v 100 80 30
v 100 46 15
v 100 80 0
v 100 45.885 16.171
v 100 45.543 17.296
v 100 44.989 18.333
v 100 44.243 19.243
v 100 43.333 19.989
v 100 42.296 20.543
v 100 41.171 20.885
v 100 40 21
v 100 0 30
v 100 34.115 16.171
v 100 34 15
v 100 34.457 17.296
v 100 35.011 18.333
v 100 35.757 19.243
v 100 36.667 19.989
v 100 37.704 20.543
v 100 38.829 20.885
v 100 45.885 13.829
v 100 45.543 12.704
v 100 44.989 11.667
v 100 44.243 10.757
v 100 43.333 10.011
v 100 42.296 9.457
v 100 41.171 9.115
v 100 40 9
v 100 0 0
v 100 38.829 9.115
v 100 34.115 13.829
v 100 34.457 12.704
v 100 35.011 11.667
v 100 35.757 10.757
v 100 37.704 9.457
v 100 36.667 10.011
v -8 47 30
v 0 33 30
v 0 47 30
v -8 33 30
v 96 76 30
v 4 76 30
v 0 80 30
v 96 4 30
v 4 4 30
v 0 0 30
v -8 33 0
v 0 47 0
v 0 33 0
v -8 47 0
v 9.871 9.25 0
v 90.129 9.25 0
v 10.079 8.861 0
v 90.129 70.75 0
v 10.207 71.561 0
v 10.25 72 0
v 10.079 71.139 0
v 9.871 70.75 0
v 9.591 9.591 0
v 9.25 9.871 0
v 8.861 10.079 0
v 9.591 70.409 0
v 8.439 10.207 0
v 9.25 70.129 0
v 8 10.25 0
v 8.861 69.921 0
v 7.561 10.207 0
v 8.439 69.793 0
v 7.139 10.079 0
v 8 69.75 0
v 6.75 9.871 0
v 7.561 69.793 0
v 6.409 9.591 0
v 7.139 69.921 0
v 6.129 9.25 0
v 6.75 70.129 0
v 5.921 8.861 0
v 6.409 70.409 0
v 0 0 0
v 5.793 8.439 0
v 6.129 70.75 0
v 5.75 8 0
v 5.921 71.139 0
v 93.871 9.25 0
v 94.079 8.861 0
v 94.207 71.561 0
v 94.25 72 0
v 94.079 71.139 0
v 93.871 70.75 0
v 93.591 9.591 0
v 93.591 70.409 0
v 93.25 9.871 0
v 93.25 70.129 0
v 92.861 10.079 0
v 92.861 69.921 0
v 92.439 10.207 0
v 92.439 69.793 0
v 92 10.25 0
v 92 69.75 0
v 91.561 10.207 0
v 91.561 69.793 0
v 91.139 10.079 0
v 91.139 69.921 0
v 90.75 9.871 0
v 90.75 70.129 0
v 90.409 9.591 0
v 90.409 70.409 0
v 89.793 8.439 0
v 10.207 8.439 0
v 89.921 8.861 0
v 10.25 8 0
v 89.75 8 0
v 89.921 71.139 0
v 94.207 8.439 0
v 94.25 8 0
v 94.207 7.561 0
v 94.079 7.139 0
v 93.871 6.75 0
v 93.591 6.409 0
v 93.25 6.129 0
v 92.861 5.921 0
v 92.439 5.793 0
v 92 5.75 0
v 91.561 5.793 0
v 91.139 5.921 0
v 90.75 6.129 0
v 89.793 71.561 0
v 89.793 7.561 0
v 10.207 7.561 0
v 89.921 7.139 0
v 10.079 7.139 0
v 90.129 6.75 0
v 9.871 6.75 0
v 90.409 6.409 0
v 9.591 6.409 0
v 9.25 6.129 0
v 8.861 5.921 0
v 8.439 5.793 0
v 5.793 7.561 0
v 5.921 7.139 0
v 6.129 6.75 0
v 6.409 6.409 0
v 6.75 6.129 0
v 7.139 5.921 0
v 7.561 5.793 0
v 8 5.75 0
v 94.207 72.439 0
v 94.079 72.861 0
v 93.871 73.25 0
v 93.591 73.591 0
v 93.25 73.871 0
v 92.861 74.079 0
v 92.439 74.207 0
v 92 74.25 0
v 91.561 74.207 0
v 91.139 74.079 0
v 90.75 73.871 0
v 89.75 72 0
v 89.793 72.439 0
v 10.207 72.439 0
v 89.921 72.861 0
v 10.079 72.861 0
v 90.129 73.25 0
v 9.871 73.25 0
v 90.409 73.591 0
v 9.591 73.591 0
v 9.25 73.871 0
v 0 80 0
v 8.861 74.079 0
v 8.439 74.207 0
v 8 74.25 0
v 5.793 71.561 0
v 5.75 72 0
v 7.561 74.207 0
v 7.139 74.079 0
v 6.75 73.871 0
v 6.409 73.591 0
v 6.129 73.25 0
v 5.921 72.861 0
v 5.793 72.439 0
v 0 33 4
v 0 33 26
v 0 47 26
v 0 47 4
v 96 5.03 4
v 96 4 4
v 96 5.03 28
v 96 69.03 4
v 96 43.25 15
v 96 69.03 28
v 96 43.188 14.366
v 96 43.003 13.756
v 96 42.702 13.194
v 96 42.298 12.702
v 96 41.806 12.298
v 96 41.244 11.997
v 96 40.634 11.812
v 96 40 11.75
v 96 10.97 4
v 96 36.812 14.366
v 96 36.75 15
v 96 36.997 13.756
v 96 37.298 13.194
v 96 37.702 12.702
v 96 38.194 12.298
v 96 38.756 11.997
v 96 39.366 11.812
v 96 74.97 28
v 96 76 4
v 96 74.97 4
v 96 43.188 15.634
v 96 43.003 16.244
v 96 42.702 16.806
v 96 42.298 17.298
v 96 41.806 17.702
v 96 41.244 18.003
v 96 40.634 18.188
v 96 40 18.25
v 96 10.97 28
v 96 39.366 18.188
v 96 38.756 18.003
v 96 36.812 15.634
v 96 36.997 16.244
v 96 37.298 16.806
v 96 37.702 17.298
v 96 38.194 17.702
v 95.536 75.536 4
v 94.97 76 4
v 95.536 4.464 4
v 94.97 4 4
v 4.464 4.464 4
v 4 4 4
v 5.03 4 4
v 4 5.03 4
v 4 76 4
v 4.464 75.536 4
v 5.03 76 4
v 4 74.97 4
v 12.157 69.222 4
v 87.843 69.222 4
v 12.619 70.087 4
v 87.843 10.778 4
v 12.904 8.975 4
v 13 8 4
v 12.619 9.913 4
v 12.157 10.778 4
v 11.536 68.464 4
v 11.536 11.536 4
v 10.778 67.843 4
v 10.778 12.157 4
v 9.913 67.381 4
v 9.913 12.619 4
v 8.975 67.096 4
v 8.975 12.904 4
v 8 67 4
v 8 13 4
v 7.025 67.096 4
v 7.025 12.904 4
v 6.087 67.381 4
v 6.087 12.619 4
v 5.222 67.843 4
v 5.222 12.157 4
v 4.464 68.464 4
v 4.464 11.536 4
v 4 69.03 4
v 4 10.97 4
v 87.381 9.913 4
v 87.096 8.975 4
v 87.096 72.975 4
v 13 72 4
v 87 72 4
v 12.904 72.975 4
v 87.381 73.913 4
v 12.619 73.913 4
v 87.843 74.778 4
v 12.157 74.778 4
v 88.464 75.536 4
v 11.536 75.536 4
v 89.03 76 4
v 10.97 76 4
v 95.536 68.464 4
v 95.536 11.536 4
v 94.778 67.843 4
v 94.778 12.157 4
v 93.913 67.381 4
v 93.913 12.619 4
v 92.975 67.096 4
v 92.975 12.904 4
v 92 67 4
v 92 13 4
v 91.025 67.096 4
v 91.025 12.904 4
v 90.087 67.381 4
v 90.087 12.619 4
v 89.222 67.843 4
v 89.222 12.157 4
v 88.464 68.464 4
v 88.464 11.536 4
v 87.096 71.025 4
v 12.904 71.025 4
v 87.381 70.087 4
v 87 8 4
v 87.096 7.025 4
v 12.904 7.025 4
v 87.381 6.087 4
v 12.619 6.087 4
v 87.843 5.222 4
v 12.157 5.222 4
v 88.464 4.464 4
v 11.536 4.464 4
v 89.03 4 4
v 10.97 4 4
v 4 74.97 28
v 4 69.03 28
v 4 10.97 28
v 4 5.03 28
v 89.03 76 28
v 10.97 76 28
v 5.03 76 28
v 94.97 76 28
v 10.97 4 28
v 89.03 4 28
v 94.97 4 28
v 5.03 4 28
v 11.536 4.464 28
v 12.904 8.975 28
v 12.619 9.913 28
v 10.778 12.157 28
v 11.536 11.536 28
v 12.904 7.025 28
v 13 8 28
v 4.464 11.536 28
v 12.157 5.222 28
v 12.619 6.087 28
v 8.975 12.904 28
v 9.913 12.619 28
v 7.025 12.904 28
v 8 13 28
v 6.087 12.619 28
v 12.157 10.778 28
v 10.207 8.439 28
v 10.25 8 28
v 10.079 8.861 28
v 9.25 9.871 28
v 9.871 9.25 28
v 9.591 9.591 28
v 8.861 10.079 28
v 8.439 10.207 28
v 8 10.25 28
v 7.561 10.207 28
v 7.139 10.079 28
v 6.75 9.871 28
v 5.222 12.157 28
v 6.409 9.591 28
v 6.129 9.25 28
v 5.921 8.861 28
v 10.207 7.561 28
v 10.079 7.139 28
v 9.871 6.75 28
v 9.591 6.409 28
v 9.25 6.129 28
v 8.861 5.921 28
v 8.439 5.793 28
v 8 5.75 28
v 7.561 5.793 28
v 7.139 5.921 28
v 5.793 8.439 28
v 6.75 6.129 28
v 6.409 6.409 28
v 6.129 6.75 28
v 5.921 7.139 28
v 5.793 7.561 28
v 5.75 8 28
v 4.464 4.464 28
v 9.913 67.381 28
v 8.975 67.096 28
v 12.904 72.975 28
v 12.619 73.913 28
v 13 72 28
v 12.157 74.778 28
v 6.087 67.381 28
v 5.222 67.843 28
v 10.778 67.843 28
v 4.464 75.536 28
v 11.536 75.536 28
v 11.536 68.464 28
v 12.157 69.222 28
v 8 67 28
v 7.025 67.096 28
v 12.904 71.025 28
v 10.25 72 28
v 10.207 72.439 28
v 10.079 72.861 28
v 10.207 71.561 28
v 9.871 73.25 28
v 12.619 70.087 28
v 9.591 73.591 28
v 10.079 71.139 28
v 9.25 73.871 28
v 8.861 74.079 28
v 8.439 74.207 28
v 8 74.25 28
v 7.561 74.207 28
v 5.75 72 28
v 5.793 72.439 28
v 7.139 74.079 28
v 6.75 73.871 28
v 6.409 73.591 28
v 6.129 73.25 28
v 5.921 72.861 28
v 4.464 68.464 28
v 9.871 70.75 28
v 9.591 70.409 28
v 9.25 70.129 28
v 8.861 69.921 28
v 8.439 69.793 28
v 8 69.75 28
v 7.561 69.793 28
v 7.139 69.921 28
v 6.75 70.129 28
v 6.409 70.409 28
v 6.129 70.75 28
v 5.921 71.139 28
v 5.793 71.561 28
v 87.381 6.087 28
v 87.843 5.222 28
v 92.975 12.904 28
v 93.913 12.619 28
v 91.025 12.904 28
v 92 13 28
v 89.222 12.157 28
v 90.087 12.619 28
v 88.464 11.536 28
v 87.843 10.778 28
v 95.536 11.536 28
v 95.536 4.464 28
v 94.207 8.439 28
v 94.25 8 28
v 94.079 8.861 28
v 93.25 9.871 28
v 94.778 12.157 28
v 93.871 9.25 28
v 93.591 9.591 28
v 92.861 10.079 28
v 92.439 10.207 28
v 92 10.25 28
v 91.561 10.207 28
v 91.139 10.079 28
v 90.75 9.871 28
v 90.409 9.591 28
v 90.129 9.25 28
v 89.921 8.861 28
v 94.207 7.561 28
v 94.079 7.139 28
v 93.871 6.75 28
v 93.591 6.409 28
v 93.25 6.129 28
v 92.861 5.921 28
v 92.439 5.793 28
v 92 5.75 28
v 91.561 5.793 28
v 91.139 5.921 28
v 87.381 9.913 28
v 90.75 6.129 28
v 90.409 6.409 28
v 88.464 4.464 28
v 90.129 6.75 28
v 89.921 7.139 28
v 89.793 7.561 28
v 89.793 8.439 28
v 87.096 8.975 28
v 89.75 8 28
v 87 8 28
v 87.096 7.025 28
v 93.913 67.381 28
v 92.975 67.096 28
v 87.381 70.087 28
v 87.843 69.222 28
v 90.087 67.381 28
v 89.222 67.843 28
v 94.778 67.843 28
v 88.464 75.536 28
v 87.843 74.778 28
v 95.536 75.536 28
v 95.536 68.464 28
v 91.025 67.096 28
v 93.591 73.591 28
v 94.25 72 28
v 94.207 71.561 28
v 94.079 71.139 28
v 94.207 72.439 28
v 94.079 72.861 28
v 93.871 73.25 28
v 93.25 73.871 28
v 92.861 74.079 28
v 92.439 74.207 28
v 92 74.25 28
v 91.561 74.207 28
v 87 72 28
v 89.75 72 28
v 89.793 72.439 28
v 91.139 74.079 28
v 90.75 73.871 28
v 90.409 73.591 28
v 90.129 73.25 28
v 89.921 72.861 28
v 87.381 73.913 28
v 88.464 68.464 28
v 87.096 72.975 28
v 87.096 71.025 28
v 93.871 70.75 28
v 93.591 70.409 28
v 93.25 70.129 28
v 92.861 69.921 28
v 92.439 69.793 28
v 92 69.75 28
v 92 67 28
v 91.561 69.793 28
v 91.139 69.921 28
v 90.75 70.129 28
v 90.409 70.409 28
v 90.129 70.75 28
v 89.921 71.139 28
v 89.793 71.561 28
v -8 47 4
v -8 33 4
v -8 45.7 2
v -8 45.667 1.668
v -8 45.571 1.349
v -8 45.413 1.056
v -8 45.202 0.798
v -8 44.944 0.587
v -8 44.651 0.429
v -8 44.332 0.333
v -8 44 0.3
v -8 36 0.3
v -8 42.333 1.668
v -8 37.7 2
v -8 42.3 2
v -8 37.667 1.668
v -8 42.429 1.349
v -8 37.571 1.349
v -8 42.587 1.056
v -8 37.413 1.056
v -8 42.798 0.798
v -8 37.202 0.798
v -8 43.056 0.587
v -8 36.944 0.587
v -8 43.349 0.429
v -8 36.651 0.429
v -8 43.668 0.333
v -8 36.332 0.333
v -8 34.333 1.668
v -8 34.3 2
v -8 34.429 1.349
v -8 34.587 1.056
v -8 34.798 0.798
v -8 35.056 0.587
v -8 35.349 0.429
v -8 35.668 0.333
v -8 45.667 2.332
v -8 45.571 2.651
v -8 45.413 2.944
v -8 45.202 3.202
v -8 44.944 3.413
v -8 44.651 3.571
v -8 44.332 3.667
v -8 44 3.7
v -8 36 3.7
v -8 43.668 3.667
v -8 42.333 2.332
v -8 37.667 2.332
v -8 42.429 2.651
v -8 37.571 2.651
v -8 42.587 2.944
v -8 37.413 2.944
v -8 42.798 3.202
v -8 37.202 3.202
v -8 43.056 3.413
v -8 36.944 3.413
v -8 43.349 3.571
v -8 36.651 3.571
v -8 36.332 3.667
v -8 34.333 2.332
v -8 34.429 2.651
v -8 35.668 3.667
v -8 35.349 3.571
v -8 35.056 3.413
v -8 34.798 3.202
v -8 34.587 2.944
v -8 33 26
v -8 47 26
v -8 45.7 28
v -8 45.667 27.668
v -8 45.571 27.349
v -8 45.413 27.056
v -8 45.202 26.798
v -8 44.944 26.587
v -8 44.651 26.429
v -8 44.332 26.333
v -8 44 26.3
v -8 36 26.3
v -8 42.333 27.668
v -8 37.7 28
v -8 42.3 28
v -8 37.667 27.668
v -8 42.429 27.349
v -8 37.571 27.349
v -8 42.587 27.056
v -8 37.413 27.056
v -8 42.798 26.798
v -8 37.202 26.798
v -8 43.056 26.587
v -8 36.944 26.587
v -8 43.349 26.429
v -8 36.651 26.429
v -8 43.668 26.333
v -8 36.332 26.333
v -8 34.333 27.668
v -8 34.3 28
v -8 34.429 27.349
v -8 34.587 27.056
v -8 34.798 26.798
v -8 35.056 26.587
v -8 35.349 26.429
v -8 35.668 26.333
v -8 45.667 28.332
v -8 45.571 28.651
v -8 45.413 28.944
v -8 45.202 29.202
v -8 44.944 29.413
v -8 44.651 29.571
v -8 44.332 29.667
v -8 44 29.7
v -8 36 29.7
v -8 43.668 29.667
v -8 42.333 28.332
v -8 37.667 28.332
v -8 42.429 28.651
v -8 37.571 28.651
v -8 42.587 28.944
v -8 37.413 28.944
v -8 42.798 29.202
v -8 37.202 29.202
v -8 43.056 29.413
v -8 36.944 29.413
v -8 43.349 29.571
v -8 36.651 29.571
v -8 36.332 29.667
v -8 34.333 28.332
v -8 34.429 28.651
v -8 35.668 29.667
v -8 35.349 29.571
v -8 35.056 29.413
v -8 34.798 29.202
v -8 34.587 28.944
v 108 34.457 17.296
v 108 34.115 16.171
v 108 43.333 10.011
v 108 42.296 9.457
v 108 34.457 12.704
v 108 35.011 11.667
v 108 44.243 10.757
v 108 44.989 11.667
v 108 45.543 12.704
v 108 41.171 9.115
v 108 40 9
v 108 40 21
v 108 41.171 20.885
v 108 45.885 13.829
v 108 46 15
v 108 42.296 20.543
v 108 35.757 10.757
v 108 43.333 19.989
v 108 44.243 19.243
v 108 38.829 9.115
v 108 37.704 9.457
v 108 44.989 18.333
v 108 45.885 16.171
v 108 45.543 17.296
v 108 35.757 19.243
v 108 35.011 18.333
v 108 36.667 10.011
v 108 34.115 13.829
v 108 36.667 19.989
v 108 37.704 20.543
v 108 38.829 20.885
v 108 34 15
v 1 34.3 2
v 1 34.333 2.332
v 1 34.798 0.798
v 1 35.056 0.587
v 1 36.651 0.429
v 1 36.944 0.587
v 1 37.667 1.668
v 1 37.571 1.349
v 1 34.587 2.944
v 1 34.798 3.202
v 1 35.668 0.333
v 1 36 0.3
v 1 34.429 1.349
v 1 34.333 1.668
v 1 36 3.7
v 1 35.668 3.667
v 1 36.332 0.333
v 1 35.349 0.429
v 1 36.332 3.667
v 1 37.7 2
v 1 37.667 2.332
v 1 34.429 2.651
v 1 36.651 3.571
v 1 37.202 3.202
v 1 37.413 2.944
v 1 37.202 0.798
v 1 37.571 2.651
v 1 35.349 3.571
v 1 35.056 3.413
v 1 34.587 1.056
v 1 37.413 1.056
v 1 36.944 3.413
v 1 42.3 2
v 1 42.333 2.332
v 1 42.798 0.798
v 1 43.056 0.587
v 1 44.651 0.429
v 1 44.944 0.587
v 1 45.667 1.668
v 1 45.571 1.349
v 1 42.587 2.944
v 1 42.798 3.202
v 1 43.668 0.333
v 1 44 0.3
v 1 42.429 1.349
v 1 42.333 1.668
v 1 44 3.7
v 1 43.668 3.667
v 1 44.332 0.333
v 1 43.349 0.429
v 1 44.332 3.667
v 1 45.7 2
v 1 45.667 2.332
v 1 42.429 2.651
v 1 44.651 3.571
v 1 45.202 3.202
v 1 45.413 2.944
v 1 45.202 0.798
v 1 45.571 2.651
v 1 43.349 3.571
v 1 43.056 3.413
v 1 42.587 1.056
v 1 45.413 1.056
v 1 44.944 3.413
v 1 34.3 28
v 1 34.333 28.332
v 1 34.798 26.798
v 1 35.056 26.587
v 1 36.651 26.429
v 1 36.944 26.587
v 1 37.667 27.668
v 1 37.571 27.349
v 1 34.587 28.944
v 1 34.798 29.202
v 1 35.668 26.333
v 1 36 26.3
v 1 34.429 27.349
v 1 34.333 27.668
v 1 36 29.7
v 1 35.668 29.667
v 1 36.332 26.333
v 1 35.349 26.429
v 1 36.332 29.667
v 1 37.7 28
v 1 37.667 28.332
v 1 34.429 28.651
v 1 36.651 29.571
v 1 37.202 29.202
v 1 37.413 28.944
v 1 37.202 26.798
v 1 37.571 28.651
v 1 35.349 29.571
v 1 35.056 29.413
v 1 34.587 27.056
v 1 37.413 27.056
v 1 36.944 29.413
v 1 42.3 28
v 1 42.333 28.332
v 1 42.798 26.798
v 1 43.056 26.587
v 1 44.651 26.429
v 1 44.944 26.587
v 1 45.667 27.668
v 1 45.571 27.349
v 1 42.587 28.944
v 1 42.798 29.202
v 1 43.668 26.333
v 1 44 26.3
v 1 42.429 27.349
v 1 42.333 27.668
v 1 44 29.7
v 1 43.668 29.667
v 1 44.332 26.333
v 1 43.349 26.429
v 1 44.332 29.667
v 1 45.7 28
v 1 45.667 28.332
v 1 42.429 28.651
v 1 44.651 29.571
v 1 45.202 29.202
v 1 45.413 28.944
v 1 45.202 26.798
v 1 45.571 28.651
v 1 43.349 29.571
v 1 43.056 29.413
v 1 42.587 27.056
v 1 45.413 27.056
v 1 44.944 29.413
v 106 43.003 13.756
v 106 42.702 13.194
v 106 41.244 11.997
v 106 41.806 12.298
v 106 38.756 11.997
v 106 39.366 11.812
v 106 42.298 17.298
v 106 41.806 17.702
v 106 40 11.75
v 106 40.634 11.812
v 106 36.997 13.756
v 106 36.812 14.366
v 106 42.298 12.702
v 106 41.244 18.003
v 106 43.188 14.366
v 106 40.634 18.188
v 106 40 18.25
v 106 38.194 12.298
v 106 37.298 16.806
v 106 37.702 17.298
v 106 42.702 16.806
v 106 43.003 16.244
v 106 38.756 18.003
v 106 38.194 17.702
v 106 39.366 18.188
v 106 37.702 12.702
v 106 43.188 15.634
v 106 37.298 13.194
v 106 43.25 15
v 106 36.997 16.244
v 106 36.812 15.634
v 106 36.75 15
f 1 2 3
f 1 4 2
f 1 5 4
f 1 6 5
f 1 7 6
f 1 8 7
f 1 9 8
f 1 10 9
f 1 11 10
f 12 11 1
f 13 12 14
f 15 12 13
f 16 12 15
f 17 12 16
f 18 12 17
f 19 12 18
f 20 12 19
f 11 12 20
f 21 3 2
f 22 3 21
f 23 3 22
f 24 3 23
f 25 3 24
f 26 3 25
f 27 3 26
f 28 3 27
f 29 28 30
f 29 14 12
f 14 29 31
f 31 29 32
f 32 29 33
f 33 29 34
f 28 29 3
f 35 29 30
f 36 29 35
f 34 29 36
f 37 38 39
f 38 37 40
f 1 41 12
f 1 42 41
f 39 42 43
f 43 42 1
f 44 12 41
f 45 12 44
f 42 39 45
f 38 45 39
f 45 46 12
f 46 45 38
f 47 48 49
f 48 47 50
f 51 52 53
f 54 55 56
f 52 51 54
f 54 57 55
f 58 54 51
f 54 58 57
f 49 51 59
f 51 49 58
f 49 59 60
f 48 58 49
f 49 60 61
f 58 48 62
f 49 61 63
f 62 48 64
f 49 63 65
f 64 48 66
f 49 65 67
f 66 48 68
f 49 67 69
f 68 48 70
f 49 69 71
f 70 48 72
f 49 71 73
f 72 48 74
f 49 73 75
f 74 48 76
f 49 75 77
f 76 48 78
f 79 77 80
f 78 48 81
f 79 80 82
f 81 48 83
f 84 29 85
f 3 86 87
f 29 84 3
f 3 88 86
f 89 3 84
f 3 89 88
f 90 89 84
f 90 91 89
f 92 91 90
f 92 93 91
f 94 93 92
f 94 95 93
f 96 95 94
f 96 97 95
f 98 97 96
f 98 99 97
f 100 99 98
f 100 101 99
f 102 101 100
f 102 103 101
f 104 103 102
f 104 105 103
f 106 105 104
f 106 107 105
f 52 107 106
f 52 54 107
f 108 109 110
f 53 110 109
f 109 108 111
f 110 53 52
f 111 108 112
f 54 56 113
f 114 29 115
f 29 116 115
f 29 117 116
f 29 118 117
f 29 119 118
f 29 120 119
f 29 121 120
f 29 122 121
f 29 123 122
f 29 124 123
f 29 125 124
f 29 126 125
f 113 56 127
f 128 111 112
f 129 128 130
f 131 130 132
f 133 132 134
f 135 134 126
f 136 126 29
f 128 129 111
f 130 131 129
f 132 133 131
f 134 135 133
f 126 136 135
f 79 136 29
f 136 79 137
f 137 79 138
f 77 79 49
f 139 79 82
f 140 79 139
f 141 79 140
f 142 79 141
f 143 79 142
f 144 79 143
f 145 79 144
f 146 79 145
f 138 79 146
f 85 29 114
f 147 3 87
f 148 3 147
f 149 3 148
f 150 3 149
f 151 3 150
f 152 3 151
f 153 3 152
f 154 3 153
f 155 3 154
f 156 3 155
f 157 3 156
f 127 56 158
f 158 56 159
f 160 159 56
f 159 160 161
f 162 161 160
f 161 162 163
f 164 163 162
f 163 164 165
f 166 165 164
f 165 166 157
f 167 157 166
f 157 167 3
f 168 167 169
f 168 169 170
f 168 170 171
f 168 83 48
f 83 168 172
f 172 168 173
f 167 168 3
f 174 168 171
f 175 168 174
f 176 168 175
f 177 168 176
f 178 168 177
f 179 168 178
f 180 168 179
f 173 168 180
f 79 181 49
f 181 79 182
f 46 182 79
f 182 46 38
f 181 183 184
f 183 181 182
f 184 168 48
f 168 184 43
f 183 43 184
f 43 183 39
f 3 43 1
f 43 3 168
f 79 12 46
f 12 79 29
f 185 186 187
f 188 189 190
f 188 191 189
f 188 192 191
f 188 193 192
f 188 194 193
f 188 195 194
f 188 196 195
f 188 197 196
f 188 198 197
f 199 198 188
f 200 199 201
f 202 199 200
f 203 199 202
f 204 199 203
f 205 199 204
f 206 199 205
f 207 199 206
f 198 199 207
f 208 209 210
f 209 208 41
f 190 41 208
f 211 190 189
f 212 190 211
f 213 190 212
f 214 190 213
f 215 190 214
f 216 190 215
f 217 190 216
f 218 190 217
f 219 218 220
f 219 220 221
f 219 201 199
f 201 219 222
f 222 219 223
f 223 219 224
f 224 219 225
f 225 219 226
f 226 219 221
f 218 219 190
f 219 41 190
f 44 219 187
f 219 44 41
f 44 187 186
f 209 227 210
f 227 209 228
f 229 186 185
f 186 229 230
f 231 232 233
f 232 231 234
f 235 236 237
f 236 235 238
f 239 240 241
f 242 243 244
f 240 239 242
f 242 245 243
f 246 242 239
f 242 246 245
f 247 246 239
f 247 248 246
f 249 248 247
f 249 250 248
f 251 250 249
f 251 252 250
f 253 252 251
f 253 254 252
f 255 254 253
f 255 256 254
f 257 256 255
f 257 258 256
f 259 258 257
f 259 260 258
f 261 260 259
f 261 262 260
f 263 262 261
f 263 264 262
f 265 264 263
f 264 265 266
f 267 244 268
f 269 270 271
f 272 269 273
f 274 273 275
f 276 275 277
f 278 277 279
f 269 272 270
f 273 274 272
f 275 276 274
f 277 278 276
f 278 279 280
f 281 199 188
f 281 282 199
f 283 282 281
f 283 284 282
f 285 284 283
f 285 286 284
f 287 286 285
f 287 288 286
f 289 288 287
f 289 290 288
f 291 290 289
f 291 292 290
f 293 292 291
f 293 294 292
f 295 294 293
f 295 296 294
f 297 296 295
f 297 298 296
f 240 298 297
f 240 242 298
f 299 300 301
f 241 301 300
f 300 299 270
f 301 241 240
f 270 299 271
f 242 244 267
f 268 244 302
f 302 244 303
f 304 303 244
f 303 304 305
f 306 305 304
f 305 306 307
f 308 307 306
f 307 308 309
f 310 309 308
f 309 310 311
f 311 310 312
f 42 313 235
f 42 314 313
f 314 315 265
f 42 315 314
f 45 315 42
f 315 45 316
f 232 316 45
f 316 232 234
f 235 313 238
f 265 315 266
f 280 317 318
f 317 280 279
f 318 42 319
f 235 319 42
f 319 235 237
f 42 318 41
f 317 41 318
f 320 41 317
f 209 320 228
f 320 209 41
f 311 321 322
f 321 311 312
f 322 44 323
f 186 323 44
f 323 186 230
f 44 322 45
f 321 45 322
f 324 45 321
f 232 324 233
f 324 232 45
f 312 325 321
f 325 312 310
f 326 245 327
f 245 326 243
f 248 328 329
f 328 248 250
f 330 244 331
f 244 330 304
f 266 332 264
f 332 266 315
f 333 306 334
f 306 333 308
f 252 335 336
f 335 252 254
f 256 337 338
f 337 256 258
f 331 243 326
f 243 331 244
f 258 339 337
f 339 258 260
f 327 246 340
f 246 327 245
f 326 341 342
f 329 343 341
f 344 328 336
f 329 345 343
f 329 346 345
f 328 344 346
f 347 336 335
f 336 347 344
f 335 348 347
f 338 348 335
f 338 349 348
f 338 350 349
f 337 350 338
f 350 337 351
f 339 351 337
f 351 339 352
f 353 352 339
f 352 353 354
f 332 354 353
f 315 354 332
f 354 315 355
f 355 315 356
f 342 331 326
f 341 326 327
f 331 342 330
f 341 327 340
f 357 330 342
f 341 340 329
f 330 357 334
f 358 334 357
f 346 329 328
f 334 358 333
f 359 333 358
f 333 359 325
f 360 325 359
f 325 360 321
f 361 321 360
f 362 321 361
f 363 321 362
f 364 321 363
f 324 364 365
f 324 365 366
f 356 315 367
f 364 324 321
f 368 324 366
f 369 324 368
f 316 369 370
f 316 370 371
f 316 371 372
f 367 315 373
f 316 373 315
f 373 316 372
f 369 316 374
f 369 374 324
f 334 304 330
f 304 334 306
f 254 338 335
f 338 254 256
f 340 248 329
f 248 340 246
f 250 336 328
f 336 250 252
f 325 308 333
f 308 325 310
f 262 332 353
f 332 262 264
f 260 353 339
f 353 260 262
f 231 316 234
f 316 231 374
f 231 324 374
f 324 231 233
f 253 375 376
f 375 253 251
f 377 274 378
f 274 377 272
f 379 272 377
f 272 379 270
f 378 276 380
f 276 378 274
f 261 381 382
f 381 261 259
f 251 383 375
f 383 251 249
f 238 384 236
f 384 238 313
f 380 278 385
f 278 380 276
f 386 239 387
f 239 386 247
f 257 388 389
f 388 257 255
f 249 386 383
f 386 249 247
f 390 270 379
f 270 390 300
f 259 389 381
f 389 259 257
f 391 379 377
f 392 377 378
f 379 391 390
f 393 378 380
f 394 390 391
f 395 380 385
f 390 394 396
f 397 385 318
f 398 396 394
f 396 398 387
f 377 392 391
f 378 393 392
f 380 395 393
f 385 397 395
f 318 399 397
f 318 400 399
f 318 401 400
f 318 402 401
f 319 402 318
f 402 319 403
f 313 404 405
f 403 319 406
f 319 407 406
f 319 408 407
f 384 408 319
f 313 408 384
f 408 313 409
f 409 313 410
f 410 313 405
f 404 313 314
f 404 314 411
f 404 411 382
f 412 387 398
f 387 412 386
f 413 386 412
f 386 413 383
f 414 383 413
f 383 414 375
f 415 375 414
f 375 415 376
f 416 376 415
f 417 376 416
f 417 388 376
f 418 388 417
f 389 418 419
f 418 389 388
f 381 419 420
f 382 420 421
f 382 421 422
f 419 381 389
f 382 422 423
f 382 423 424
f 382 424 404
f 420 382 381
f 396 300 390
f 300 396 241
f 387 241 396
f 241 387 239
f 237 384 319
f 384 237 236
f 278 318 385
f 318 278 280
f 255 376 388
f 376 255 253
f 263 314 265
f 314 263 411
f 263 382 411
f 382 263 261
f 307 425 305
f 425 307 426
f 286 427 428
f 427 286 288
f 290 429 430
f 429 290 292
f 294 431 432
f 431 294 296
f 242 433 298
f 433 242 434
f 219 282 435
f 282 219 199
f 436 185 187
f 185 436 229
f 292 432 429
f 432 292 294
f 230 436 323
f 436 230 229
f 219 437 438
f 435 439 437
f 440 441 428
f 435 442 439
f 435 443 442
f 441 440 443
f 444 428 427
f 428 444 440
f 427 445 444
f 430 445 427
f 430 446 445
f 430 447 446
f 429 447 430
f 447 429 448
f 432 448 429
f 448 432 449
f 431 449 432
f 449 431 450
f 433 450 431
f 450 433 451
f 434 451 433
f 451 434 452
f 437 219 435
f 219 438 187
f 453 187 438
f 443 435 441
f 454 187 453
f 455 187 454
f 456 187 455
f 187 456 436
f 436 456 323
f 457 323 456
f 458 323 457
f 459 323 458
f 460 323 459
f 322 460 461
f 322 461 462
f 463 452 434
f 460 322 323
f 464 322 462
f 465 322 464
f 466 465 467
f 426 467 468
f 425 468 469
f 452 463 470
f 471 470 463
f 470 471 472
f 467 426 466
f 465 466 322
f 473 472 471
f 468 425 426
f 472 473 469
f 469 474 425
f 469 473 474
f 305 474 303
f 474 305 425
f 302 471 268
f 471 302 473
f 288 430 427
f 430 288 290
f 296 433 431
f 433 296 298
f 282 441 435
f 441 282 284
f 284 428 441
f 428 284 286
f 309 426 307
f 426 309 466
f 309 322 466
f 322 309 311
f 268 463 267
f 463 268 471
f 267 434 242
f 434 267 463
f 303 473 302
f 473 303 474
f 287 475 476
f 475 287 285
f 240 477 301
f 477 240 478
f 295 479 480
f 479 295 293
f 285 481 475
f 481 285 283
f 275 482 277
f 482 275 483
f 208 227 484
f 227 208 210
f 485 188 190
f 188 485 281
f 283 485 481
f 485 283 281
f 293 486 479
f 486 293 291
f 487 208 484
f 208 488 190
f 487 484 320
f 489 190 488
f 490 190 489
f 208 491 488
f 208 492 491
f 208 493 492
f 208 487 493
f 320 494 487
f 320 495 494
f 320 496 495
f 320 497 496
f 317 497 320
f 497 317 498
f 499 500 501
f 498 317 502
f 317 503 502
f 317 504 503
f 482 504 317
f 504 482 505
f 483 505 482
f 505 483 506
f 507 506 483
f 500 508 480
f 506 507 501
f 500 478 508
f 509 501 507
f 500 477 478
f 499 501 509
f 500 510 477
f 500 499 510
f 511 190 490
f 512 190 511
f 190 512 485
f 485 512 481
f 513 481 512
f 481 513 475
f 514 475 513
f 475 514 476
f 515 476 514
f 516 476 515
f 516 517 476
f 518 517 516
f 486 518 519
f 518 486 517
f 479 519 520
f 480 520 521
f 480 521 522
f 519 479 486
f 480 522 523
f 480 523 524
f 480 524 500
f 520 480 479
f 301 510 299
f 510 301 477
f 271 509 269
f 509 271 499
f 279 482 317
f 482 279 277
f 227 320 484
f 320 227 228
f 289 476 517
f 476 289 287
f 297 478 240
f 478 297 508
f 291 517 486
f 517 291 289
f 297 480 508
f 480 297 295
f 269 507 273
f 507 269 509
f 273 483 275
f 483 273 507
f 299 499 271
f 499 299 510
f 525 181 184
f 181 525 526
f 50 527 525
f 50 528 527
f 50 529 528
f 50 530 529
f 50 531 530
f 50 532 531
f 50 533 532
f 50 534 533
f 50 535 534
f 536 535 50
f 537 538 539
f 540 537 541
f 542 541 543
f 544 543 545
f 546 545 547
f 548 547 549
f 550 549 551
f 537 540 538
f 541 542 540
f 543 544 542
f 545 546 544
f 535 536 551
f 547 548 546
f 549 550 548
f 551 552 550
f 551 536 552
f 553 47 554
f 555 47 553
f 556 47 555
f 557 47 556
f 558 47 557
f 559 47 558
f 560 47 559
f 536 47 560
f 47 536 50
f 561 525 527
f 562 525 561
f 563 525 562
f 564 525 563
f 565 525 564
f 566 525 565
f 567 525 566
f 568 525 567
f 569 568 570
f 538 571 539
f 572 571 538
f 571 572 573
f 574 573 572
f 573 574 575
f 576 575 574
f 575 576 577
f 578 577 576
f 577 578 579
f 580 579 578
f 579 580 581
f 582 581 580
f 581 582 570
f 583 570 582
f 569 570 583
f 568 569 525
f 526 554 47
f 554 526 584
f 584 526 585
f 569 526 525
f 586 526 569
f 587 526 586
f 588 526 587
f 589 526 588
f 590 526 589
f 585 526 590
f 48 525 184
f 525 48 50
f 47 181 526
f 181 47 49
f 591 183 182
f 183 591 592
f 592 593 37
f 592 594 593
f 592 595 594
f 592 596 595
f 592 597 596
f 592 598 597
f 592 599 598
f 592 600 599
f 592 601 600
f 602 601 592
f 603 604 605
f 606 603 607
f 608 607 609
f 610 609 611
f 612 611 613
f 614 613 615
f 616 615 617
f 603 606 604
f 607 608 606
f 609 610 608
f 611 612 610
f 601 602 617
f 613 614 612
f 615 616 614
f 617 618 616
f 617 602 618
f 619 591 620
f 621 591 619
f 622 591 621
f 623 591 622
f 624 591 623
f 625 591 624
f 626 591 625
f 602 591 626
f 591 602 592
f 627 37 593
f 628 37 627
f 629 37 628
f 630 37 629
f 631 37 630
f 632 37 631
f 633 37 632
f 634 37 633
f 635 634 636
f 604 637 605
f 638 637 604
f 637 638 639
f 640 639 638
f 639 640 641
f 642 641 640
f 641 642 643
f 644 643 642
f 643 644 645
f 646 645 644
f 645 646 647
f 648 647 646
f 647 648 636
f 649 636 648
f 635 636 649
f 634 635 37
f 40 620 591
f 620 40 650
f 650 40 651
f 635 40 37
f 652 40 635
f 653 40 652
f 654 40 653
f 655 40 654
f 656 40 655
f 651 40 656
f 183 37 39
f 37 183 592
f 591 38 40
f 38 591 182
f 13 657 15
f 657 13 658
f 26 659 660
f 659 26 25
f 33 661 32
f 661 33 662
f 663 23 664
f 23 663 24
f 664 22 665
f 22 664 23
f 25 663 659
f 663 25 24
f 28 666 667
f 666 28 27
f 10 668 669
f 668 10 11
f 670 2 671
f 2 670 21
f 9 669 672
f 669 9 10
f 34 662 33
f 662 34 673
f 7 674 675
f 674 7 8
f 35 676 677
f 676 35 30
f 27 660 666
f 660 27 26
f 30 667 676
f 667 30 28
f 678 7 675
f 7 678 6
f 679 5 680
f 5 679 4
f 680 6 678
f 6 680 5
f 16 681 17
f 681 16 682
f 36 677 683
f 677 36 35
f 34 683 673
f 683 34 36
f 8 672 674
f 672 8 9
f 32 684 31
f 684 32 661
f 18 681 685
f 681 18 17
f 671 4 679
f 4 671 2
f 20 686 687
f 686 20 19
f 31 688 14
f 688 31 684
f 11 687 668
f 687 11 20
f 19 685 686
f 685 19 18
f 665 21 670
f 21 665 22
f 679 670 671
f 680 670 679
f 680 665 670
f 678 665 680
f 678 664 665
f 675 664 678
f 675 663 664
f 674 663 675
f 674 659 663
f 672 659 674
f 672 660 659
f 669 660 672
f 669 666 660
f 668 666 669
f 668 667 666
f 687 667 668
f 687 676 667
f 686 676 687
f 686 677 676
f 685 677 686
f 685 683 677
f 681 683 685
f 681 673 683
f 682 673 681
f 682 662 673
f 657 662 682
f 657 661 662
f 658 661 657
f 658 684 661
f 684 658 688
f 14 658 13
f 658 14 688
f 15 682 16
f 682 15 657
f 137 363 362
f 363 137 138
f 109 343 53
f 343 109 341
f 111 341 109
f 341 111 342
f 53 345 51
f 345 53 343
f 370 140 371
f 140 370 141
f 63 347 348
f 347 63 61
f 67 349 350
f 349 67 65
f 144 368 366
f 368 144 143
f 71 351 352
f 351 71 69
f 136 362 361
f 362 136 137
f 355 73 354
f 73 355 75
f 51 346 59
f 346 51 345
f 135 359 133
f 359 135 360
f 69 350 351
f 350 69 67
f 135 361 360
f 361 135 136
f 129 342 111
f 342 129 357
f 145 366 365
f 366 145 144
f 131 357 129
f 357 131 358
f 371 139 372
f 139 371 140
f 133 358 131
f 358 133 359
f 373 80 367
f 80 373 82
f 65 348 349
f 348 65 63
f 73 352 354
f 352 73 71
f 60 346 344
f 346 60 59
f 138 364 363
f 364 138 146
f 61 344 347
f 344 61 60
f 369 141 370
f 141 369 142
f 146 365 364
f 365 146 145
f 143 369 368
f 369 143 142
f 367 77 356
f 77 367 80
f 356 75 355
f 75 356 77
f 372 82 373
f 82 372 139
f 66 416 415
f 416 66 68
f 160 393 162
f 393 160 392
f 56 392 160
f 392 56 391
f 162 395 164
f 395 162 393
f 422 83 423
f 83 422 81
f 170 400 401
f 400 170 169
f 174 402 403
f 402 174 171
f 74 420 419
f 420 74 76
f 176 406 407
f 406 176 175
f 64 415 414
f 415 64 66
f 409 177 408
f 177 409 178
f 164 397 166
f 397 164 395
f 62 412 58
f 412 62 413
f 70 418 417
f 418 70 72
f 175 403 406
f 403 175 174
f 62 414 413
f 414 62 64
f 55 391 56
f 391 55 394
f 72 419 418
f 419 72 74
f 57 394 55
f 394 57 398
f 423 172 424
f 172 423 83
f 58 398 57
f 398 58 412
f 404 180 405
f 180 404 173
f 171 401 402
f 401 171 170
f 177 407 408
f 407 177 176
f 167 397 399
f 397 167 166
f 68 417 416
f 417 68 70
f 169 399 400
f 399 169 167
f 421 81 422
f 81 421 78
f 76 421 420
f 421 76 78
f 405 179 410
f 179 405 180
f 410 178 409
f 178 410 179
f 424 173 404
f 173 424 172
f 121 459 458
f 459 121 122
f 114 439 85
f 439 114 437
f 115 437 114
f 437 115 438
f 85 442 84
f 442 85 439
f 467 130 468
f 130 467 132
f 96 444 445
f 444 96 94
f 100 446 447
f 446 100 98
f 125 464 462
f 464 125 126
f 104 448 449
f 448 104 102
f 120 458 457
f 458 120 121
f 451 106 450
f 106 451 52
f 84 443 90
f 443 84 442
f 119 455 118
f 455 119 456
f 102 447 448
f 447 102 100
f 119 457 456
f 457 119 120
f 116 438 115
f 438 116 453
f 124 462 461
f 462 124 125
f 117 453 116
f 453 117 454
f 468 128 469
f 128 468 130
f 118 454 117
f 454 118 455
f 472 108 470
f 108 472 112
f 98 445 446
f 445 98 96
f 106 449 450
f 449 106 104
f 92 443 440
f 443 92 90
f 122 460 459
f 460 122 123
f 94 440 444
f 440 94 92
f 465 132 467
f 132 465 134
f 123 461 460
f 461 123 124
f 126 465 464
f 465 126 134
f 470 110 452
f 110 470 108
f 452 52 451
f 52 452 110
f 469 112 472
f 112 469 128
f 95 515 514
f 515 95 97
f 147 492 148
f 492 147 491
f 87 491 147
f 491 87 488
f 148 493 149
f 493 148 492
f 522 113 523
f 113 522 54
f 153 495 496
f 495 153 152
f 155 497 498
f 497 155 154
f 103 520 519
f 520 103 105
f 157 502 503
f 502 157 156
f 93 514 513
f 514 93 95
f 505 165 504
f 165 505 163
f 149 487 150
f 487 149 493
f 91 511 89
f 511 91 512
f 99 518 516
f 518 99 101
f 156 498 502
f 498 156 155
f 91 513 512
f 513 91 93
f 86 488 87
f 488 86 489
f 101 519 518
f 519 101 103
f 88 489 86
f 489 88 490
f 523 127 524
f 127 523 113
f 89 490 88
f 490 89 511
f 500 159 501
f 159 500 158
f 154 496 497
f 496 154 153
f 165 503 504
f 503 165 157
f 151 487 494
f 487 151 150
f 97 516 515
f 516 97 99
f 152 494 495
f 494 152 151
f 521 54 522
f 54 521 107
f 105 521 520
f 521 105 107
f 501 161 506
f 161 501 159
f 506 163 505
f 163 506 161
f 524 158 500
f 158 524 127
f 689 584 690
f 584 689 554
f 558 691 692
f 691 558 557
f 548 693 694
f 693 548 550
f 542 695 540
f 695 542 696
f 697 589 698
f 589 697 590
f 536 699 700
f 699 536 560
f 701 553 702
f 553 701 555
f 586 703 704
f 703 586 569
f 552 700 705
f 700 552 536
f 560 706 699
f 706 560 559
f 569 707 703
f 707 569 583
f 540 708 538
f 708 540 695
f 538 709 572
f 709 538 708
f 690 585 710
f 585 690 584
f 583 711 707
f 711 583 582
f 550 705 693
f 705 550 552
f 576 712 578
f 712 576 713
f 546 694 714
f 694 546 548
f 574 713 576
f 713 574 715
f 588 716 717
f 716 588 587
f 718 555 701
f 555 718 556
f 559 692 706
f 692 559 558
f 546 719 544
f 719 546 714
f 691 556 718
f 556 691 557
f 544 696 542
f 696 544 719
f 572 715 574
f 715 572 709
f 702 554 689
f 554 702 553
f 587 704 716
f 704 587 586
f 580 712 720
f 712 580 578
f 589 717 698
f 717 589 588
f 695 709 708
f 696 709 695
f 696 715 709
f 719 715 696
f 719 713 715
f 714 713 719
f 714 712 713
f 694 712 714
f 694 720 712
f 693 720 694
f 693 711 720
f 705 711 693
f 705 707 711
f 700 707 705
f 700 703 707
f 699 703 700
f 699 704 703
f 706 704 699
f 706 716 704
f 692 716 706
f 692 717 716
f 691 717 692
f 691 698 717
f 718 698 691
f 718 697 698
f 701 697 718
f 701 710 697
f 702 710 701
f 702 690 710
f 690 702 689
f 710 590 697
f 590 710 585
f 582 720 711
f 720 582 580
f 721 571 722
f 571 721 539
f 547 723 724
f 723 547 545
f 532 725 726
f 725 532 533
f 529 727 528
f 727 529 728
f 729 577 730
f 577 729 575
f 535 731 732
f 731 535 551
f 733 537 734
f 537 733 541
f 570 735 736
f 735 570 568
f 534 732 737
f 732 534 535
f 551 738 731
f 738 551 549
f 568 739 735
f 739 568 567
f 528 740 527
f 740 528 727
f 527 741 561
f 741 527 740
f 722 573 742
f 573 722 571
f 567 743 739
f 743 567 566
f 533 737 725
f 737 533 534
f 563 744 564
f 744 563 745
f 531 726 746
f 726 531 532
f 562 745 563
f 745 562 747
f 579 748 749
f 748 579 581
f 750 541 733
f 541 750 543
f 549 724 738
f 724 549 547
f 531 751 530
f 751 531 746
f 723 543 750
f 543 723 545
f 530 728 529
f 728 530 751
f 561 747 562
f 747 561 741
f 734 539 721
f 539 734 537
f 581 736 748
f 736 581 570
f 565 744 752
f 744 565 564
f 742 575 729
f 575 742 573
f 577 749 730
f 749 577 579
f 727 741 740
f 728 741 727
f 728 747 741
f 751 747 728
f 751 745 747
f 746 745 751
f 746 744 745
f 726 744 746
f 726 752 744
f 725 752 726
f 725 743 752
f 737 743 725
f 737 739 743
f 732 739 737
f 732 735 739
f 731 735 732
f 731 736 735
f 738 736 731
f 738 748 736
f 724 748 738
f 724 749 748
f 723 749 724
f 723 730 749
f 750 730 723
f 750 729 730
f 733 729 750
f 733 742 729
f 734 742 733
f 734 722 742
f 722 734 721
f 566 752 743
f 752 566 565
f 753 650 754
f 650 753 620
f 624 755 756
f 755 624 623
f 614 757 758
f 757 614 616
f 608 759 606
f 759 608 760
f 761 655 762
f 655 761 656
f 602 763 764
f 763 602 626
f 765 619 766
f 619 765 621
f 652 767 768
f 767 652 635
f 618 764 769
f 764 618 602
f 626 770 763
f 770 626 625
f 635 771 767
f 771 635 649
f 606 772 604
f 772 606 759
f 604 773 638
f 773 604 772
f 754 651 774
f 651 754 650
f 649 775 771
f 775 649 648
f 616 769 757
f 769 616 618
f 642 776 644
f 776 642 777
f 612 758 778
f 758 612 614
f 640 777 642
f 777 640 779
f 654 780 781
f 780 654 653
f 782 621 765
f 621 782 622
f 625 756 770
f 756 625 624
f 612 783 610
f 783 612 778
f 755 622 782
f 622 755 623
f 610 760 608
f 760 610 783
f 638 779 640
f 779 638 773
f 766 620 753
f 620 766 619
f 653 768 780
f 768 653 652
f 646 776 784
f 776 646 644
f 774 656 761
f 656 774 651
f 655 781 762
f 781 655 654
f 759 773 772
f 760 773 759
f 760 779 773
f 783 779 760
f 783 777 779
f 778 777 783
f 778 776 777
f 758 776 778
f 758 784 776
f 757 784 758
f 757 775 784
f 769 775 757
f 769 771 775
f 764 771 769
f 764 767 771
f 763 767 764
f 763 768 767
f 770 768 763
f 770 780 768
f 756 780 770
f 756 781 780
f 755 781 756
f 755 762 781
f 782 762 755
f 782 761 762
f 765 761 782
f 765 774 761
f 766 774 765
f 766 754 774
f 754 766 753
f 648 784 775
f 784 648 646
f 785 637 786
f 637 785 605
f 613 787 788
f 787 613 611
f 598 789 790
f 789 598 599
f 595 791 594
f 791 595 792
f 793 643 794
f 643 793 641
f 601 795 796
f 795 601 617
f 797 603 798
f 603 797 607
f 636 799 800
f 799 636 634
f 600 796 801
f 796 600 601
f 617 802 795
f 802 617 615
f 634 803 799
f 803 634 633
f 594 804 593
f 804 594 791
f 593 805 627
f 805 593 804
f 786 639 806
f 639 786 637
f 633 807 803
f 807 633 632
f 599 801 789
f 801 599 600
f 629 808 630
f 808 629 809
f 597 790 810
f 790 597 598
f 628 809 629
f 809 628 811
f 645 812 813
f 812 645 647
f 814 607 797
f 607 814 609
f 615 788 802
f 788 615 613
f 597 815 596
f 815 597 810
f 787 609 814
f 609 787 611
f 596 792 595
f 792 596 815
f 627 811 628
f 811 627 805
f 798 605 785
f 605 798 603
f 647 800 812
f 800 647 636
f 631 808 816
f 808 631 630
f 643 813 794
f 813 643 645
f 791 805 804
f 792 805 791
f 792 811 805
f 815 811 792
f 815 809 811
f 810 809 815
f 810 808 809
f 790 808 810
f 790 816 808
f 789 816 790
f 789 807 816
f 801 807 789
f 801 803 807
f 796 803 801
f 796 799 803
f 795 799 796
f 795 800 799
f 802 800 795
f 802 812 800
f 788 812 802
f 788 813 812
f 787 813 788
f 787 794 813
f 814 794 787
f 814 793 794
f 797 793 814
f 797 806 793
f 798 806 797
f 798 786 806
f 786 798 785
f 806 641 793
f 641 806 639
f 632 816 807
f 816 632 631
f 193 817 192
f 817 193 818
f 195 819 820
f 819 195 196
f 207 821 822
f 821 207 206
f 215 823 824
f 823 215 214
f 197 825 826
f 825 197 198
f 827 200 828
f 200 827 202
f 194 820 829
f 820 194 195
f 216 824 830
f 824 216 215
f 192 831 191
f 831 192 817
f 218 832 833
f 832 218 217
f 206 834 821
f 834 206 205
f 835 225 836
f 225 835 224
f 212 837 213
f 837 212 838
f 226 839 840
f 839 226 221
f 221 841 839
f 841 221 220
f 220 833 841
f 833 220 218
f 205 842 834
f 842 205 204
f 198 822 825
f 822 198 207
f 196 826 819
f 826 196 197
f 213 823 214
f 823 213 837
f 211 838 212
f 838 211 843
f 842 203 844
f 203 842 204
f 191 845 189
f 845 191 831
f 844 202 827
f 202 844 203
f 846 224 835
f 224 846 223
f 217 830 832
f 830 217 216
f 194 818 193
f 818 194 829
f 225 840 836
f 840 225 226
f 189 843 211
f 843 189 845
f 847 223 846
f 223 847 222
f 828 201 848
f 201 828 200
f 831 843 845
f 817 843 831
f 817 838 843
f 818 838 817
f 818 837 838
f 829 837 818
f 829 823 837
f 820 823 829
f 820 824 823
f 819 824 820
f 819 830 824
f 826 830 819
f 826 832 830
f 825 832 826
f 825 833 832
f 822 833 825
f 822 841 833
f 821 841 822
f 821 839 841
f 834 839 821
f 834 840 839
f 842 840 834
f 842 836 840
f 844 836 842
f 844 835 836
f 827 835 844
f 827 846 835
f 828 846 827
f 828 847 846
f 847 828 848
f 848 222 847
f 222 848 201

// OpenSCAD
$fn = 32;

// ----------------------------------------------------------------------
// Enclosure body: 100 x 80 x 30 mm, wall 4 mm
// ----------------------------------------------------------------------

// --- parameters (mm) ---
length = 100;             // outside length, X
width = 80;               // outside width, Y
height = 30;              // outside height, Z
wall = 4;                 // side wall thickness
floor_t = 4;              // floor thickness
boss_d = 10;              // corner boss diameter
boss_h = 24;              // corner boss height above the floor
boss_hole_d = 4.5;        // lid screw clearance in the boss
boss_lip = 8;             // boss centre inset from the corner
ear_w = 14;               // mounting ear width
ear_t = 4;                // mounting ear thickness
ear_ext = 8;              // mounting ear reach
ear_hole_d = 3.4;         // mounting ear drills
nipple_d = 12;            // cable gland boss diameter
nipple_h = 8;             // cable gland boss height
nipple_bore = 6.5;        // cable gland bore

module shell() {
  difference() {
    cube([length, width, height]);
    /* hollow, open at the top */
    translate([wall, wall, floor_t])
      cube([length - 2 * wall, width - 2 * wall, height]);
  }
}

module bosses() {
  /* corner bosses, sunk 1 mm into the floor */
  for (sx = [0, 1]) for (sy = [0, 1])
    translate([sx * (length - 2 * boss_lip) + boss_lip, sy * (width - 2 * boss_lip) + boss_lip, floor_t - 1])
      cylinder(h = boss_h + 1, d = boss_d);
}

module gland() {
  /* boss on the short wall, sunk 1 mm into it */
  translate([length - 1, width / 2, height * 0.5]) rotate([0, 90, 0])
    cylinder(h = nipple_h + 1, d = nipple_d);
}

module ears() {
  /* mounting ears on the short walls, sunk into the wall */
  for (sz = [0, 1])
    translate([-ear_ext, width / 2 - ear_w / 2, sz * (height - ear_t)])
      cube([ear_ext + 2.5, ear_w, ear_t]);
}

difference() {
  union() {
    shell();
    bosses();
    gland();
    ears();
  }
  /* boss screw holes */
  for (sx = [0, 1]) for (sy = [0, 1])
    translate([sx * (length - 2 * boss_lip) + boss_lip, sy * (width - 2 * boss_lip) + boss_lip, -1]) cylinder(h = floor_t + boss_h + 2, d = boss_hole_d);
  translate([length, width / 2, height * 0.5]) rotate([0, 90, 0]) translate([0, 0, -nipple_h - 2]) cylinder(h = nipple_h + wall + 4, d = nipple_bore);
  for (sz = [0, 1]) for (sx = [0, 1]) translate([-ear_ext - 1, width / 2 + (2 * sx - 1) * (ear_w / 2 - 3), sz * (height - ear_t) + ear_t / 2]) rotate([0, 90, 0]) cylinder(h = ear_ext + 2, d = ear_hole_d);
}
